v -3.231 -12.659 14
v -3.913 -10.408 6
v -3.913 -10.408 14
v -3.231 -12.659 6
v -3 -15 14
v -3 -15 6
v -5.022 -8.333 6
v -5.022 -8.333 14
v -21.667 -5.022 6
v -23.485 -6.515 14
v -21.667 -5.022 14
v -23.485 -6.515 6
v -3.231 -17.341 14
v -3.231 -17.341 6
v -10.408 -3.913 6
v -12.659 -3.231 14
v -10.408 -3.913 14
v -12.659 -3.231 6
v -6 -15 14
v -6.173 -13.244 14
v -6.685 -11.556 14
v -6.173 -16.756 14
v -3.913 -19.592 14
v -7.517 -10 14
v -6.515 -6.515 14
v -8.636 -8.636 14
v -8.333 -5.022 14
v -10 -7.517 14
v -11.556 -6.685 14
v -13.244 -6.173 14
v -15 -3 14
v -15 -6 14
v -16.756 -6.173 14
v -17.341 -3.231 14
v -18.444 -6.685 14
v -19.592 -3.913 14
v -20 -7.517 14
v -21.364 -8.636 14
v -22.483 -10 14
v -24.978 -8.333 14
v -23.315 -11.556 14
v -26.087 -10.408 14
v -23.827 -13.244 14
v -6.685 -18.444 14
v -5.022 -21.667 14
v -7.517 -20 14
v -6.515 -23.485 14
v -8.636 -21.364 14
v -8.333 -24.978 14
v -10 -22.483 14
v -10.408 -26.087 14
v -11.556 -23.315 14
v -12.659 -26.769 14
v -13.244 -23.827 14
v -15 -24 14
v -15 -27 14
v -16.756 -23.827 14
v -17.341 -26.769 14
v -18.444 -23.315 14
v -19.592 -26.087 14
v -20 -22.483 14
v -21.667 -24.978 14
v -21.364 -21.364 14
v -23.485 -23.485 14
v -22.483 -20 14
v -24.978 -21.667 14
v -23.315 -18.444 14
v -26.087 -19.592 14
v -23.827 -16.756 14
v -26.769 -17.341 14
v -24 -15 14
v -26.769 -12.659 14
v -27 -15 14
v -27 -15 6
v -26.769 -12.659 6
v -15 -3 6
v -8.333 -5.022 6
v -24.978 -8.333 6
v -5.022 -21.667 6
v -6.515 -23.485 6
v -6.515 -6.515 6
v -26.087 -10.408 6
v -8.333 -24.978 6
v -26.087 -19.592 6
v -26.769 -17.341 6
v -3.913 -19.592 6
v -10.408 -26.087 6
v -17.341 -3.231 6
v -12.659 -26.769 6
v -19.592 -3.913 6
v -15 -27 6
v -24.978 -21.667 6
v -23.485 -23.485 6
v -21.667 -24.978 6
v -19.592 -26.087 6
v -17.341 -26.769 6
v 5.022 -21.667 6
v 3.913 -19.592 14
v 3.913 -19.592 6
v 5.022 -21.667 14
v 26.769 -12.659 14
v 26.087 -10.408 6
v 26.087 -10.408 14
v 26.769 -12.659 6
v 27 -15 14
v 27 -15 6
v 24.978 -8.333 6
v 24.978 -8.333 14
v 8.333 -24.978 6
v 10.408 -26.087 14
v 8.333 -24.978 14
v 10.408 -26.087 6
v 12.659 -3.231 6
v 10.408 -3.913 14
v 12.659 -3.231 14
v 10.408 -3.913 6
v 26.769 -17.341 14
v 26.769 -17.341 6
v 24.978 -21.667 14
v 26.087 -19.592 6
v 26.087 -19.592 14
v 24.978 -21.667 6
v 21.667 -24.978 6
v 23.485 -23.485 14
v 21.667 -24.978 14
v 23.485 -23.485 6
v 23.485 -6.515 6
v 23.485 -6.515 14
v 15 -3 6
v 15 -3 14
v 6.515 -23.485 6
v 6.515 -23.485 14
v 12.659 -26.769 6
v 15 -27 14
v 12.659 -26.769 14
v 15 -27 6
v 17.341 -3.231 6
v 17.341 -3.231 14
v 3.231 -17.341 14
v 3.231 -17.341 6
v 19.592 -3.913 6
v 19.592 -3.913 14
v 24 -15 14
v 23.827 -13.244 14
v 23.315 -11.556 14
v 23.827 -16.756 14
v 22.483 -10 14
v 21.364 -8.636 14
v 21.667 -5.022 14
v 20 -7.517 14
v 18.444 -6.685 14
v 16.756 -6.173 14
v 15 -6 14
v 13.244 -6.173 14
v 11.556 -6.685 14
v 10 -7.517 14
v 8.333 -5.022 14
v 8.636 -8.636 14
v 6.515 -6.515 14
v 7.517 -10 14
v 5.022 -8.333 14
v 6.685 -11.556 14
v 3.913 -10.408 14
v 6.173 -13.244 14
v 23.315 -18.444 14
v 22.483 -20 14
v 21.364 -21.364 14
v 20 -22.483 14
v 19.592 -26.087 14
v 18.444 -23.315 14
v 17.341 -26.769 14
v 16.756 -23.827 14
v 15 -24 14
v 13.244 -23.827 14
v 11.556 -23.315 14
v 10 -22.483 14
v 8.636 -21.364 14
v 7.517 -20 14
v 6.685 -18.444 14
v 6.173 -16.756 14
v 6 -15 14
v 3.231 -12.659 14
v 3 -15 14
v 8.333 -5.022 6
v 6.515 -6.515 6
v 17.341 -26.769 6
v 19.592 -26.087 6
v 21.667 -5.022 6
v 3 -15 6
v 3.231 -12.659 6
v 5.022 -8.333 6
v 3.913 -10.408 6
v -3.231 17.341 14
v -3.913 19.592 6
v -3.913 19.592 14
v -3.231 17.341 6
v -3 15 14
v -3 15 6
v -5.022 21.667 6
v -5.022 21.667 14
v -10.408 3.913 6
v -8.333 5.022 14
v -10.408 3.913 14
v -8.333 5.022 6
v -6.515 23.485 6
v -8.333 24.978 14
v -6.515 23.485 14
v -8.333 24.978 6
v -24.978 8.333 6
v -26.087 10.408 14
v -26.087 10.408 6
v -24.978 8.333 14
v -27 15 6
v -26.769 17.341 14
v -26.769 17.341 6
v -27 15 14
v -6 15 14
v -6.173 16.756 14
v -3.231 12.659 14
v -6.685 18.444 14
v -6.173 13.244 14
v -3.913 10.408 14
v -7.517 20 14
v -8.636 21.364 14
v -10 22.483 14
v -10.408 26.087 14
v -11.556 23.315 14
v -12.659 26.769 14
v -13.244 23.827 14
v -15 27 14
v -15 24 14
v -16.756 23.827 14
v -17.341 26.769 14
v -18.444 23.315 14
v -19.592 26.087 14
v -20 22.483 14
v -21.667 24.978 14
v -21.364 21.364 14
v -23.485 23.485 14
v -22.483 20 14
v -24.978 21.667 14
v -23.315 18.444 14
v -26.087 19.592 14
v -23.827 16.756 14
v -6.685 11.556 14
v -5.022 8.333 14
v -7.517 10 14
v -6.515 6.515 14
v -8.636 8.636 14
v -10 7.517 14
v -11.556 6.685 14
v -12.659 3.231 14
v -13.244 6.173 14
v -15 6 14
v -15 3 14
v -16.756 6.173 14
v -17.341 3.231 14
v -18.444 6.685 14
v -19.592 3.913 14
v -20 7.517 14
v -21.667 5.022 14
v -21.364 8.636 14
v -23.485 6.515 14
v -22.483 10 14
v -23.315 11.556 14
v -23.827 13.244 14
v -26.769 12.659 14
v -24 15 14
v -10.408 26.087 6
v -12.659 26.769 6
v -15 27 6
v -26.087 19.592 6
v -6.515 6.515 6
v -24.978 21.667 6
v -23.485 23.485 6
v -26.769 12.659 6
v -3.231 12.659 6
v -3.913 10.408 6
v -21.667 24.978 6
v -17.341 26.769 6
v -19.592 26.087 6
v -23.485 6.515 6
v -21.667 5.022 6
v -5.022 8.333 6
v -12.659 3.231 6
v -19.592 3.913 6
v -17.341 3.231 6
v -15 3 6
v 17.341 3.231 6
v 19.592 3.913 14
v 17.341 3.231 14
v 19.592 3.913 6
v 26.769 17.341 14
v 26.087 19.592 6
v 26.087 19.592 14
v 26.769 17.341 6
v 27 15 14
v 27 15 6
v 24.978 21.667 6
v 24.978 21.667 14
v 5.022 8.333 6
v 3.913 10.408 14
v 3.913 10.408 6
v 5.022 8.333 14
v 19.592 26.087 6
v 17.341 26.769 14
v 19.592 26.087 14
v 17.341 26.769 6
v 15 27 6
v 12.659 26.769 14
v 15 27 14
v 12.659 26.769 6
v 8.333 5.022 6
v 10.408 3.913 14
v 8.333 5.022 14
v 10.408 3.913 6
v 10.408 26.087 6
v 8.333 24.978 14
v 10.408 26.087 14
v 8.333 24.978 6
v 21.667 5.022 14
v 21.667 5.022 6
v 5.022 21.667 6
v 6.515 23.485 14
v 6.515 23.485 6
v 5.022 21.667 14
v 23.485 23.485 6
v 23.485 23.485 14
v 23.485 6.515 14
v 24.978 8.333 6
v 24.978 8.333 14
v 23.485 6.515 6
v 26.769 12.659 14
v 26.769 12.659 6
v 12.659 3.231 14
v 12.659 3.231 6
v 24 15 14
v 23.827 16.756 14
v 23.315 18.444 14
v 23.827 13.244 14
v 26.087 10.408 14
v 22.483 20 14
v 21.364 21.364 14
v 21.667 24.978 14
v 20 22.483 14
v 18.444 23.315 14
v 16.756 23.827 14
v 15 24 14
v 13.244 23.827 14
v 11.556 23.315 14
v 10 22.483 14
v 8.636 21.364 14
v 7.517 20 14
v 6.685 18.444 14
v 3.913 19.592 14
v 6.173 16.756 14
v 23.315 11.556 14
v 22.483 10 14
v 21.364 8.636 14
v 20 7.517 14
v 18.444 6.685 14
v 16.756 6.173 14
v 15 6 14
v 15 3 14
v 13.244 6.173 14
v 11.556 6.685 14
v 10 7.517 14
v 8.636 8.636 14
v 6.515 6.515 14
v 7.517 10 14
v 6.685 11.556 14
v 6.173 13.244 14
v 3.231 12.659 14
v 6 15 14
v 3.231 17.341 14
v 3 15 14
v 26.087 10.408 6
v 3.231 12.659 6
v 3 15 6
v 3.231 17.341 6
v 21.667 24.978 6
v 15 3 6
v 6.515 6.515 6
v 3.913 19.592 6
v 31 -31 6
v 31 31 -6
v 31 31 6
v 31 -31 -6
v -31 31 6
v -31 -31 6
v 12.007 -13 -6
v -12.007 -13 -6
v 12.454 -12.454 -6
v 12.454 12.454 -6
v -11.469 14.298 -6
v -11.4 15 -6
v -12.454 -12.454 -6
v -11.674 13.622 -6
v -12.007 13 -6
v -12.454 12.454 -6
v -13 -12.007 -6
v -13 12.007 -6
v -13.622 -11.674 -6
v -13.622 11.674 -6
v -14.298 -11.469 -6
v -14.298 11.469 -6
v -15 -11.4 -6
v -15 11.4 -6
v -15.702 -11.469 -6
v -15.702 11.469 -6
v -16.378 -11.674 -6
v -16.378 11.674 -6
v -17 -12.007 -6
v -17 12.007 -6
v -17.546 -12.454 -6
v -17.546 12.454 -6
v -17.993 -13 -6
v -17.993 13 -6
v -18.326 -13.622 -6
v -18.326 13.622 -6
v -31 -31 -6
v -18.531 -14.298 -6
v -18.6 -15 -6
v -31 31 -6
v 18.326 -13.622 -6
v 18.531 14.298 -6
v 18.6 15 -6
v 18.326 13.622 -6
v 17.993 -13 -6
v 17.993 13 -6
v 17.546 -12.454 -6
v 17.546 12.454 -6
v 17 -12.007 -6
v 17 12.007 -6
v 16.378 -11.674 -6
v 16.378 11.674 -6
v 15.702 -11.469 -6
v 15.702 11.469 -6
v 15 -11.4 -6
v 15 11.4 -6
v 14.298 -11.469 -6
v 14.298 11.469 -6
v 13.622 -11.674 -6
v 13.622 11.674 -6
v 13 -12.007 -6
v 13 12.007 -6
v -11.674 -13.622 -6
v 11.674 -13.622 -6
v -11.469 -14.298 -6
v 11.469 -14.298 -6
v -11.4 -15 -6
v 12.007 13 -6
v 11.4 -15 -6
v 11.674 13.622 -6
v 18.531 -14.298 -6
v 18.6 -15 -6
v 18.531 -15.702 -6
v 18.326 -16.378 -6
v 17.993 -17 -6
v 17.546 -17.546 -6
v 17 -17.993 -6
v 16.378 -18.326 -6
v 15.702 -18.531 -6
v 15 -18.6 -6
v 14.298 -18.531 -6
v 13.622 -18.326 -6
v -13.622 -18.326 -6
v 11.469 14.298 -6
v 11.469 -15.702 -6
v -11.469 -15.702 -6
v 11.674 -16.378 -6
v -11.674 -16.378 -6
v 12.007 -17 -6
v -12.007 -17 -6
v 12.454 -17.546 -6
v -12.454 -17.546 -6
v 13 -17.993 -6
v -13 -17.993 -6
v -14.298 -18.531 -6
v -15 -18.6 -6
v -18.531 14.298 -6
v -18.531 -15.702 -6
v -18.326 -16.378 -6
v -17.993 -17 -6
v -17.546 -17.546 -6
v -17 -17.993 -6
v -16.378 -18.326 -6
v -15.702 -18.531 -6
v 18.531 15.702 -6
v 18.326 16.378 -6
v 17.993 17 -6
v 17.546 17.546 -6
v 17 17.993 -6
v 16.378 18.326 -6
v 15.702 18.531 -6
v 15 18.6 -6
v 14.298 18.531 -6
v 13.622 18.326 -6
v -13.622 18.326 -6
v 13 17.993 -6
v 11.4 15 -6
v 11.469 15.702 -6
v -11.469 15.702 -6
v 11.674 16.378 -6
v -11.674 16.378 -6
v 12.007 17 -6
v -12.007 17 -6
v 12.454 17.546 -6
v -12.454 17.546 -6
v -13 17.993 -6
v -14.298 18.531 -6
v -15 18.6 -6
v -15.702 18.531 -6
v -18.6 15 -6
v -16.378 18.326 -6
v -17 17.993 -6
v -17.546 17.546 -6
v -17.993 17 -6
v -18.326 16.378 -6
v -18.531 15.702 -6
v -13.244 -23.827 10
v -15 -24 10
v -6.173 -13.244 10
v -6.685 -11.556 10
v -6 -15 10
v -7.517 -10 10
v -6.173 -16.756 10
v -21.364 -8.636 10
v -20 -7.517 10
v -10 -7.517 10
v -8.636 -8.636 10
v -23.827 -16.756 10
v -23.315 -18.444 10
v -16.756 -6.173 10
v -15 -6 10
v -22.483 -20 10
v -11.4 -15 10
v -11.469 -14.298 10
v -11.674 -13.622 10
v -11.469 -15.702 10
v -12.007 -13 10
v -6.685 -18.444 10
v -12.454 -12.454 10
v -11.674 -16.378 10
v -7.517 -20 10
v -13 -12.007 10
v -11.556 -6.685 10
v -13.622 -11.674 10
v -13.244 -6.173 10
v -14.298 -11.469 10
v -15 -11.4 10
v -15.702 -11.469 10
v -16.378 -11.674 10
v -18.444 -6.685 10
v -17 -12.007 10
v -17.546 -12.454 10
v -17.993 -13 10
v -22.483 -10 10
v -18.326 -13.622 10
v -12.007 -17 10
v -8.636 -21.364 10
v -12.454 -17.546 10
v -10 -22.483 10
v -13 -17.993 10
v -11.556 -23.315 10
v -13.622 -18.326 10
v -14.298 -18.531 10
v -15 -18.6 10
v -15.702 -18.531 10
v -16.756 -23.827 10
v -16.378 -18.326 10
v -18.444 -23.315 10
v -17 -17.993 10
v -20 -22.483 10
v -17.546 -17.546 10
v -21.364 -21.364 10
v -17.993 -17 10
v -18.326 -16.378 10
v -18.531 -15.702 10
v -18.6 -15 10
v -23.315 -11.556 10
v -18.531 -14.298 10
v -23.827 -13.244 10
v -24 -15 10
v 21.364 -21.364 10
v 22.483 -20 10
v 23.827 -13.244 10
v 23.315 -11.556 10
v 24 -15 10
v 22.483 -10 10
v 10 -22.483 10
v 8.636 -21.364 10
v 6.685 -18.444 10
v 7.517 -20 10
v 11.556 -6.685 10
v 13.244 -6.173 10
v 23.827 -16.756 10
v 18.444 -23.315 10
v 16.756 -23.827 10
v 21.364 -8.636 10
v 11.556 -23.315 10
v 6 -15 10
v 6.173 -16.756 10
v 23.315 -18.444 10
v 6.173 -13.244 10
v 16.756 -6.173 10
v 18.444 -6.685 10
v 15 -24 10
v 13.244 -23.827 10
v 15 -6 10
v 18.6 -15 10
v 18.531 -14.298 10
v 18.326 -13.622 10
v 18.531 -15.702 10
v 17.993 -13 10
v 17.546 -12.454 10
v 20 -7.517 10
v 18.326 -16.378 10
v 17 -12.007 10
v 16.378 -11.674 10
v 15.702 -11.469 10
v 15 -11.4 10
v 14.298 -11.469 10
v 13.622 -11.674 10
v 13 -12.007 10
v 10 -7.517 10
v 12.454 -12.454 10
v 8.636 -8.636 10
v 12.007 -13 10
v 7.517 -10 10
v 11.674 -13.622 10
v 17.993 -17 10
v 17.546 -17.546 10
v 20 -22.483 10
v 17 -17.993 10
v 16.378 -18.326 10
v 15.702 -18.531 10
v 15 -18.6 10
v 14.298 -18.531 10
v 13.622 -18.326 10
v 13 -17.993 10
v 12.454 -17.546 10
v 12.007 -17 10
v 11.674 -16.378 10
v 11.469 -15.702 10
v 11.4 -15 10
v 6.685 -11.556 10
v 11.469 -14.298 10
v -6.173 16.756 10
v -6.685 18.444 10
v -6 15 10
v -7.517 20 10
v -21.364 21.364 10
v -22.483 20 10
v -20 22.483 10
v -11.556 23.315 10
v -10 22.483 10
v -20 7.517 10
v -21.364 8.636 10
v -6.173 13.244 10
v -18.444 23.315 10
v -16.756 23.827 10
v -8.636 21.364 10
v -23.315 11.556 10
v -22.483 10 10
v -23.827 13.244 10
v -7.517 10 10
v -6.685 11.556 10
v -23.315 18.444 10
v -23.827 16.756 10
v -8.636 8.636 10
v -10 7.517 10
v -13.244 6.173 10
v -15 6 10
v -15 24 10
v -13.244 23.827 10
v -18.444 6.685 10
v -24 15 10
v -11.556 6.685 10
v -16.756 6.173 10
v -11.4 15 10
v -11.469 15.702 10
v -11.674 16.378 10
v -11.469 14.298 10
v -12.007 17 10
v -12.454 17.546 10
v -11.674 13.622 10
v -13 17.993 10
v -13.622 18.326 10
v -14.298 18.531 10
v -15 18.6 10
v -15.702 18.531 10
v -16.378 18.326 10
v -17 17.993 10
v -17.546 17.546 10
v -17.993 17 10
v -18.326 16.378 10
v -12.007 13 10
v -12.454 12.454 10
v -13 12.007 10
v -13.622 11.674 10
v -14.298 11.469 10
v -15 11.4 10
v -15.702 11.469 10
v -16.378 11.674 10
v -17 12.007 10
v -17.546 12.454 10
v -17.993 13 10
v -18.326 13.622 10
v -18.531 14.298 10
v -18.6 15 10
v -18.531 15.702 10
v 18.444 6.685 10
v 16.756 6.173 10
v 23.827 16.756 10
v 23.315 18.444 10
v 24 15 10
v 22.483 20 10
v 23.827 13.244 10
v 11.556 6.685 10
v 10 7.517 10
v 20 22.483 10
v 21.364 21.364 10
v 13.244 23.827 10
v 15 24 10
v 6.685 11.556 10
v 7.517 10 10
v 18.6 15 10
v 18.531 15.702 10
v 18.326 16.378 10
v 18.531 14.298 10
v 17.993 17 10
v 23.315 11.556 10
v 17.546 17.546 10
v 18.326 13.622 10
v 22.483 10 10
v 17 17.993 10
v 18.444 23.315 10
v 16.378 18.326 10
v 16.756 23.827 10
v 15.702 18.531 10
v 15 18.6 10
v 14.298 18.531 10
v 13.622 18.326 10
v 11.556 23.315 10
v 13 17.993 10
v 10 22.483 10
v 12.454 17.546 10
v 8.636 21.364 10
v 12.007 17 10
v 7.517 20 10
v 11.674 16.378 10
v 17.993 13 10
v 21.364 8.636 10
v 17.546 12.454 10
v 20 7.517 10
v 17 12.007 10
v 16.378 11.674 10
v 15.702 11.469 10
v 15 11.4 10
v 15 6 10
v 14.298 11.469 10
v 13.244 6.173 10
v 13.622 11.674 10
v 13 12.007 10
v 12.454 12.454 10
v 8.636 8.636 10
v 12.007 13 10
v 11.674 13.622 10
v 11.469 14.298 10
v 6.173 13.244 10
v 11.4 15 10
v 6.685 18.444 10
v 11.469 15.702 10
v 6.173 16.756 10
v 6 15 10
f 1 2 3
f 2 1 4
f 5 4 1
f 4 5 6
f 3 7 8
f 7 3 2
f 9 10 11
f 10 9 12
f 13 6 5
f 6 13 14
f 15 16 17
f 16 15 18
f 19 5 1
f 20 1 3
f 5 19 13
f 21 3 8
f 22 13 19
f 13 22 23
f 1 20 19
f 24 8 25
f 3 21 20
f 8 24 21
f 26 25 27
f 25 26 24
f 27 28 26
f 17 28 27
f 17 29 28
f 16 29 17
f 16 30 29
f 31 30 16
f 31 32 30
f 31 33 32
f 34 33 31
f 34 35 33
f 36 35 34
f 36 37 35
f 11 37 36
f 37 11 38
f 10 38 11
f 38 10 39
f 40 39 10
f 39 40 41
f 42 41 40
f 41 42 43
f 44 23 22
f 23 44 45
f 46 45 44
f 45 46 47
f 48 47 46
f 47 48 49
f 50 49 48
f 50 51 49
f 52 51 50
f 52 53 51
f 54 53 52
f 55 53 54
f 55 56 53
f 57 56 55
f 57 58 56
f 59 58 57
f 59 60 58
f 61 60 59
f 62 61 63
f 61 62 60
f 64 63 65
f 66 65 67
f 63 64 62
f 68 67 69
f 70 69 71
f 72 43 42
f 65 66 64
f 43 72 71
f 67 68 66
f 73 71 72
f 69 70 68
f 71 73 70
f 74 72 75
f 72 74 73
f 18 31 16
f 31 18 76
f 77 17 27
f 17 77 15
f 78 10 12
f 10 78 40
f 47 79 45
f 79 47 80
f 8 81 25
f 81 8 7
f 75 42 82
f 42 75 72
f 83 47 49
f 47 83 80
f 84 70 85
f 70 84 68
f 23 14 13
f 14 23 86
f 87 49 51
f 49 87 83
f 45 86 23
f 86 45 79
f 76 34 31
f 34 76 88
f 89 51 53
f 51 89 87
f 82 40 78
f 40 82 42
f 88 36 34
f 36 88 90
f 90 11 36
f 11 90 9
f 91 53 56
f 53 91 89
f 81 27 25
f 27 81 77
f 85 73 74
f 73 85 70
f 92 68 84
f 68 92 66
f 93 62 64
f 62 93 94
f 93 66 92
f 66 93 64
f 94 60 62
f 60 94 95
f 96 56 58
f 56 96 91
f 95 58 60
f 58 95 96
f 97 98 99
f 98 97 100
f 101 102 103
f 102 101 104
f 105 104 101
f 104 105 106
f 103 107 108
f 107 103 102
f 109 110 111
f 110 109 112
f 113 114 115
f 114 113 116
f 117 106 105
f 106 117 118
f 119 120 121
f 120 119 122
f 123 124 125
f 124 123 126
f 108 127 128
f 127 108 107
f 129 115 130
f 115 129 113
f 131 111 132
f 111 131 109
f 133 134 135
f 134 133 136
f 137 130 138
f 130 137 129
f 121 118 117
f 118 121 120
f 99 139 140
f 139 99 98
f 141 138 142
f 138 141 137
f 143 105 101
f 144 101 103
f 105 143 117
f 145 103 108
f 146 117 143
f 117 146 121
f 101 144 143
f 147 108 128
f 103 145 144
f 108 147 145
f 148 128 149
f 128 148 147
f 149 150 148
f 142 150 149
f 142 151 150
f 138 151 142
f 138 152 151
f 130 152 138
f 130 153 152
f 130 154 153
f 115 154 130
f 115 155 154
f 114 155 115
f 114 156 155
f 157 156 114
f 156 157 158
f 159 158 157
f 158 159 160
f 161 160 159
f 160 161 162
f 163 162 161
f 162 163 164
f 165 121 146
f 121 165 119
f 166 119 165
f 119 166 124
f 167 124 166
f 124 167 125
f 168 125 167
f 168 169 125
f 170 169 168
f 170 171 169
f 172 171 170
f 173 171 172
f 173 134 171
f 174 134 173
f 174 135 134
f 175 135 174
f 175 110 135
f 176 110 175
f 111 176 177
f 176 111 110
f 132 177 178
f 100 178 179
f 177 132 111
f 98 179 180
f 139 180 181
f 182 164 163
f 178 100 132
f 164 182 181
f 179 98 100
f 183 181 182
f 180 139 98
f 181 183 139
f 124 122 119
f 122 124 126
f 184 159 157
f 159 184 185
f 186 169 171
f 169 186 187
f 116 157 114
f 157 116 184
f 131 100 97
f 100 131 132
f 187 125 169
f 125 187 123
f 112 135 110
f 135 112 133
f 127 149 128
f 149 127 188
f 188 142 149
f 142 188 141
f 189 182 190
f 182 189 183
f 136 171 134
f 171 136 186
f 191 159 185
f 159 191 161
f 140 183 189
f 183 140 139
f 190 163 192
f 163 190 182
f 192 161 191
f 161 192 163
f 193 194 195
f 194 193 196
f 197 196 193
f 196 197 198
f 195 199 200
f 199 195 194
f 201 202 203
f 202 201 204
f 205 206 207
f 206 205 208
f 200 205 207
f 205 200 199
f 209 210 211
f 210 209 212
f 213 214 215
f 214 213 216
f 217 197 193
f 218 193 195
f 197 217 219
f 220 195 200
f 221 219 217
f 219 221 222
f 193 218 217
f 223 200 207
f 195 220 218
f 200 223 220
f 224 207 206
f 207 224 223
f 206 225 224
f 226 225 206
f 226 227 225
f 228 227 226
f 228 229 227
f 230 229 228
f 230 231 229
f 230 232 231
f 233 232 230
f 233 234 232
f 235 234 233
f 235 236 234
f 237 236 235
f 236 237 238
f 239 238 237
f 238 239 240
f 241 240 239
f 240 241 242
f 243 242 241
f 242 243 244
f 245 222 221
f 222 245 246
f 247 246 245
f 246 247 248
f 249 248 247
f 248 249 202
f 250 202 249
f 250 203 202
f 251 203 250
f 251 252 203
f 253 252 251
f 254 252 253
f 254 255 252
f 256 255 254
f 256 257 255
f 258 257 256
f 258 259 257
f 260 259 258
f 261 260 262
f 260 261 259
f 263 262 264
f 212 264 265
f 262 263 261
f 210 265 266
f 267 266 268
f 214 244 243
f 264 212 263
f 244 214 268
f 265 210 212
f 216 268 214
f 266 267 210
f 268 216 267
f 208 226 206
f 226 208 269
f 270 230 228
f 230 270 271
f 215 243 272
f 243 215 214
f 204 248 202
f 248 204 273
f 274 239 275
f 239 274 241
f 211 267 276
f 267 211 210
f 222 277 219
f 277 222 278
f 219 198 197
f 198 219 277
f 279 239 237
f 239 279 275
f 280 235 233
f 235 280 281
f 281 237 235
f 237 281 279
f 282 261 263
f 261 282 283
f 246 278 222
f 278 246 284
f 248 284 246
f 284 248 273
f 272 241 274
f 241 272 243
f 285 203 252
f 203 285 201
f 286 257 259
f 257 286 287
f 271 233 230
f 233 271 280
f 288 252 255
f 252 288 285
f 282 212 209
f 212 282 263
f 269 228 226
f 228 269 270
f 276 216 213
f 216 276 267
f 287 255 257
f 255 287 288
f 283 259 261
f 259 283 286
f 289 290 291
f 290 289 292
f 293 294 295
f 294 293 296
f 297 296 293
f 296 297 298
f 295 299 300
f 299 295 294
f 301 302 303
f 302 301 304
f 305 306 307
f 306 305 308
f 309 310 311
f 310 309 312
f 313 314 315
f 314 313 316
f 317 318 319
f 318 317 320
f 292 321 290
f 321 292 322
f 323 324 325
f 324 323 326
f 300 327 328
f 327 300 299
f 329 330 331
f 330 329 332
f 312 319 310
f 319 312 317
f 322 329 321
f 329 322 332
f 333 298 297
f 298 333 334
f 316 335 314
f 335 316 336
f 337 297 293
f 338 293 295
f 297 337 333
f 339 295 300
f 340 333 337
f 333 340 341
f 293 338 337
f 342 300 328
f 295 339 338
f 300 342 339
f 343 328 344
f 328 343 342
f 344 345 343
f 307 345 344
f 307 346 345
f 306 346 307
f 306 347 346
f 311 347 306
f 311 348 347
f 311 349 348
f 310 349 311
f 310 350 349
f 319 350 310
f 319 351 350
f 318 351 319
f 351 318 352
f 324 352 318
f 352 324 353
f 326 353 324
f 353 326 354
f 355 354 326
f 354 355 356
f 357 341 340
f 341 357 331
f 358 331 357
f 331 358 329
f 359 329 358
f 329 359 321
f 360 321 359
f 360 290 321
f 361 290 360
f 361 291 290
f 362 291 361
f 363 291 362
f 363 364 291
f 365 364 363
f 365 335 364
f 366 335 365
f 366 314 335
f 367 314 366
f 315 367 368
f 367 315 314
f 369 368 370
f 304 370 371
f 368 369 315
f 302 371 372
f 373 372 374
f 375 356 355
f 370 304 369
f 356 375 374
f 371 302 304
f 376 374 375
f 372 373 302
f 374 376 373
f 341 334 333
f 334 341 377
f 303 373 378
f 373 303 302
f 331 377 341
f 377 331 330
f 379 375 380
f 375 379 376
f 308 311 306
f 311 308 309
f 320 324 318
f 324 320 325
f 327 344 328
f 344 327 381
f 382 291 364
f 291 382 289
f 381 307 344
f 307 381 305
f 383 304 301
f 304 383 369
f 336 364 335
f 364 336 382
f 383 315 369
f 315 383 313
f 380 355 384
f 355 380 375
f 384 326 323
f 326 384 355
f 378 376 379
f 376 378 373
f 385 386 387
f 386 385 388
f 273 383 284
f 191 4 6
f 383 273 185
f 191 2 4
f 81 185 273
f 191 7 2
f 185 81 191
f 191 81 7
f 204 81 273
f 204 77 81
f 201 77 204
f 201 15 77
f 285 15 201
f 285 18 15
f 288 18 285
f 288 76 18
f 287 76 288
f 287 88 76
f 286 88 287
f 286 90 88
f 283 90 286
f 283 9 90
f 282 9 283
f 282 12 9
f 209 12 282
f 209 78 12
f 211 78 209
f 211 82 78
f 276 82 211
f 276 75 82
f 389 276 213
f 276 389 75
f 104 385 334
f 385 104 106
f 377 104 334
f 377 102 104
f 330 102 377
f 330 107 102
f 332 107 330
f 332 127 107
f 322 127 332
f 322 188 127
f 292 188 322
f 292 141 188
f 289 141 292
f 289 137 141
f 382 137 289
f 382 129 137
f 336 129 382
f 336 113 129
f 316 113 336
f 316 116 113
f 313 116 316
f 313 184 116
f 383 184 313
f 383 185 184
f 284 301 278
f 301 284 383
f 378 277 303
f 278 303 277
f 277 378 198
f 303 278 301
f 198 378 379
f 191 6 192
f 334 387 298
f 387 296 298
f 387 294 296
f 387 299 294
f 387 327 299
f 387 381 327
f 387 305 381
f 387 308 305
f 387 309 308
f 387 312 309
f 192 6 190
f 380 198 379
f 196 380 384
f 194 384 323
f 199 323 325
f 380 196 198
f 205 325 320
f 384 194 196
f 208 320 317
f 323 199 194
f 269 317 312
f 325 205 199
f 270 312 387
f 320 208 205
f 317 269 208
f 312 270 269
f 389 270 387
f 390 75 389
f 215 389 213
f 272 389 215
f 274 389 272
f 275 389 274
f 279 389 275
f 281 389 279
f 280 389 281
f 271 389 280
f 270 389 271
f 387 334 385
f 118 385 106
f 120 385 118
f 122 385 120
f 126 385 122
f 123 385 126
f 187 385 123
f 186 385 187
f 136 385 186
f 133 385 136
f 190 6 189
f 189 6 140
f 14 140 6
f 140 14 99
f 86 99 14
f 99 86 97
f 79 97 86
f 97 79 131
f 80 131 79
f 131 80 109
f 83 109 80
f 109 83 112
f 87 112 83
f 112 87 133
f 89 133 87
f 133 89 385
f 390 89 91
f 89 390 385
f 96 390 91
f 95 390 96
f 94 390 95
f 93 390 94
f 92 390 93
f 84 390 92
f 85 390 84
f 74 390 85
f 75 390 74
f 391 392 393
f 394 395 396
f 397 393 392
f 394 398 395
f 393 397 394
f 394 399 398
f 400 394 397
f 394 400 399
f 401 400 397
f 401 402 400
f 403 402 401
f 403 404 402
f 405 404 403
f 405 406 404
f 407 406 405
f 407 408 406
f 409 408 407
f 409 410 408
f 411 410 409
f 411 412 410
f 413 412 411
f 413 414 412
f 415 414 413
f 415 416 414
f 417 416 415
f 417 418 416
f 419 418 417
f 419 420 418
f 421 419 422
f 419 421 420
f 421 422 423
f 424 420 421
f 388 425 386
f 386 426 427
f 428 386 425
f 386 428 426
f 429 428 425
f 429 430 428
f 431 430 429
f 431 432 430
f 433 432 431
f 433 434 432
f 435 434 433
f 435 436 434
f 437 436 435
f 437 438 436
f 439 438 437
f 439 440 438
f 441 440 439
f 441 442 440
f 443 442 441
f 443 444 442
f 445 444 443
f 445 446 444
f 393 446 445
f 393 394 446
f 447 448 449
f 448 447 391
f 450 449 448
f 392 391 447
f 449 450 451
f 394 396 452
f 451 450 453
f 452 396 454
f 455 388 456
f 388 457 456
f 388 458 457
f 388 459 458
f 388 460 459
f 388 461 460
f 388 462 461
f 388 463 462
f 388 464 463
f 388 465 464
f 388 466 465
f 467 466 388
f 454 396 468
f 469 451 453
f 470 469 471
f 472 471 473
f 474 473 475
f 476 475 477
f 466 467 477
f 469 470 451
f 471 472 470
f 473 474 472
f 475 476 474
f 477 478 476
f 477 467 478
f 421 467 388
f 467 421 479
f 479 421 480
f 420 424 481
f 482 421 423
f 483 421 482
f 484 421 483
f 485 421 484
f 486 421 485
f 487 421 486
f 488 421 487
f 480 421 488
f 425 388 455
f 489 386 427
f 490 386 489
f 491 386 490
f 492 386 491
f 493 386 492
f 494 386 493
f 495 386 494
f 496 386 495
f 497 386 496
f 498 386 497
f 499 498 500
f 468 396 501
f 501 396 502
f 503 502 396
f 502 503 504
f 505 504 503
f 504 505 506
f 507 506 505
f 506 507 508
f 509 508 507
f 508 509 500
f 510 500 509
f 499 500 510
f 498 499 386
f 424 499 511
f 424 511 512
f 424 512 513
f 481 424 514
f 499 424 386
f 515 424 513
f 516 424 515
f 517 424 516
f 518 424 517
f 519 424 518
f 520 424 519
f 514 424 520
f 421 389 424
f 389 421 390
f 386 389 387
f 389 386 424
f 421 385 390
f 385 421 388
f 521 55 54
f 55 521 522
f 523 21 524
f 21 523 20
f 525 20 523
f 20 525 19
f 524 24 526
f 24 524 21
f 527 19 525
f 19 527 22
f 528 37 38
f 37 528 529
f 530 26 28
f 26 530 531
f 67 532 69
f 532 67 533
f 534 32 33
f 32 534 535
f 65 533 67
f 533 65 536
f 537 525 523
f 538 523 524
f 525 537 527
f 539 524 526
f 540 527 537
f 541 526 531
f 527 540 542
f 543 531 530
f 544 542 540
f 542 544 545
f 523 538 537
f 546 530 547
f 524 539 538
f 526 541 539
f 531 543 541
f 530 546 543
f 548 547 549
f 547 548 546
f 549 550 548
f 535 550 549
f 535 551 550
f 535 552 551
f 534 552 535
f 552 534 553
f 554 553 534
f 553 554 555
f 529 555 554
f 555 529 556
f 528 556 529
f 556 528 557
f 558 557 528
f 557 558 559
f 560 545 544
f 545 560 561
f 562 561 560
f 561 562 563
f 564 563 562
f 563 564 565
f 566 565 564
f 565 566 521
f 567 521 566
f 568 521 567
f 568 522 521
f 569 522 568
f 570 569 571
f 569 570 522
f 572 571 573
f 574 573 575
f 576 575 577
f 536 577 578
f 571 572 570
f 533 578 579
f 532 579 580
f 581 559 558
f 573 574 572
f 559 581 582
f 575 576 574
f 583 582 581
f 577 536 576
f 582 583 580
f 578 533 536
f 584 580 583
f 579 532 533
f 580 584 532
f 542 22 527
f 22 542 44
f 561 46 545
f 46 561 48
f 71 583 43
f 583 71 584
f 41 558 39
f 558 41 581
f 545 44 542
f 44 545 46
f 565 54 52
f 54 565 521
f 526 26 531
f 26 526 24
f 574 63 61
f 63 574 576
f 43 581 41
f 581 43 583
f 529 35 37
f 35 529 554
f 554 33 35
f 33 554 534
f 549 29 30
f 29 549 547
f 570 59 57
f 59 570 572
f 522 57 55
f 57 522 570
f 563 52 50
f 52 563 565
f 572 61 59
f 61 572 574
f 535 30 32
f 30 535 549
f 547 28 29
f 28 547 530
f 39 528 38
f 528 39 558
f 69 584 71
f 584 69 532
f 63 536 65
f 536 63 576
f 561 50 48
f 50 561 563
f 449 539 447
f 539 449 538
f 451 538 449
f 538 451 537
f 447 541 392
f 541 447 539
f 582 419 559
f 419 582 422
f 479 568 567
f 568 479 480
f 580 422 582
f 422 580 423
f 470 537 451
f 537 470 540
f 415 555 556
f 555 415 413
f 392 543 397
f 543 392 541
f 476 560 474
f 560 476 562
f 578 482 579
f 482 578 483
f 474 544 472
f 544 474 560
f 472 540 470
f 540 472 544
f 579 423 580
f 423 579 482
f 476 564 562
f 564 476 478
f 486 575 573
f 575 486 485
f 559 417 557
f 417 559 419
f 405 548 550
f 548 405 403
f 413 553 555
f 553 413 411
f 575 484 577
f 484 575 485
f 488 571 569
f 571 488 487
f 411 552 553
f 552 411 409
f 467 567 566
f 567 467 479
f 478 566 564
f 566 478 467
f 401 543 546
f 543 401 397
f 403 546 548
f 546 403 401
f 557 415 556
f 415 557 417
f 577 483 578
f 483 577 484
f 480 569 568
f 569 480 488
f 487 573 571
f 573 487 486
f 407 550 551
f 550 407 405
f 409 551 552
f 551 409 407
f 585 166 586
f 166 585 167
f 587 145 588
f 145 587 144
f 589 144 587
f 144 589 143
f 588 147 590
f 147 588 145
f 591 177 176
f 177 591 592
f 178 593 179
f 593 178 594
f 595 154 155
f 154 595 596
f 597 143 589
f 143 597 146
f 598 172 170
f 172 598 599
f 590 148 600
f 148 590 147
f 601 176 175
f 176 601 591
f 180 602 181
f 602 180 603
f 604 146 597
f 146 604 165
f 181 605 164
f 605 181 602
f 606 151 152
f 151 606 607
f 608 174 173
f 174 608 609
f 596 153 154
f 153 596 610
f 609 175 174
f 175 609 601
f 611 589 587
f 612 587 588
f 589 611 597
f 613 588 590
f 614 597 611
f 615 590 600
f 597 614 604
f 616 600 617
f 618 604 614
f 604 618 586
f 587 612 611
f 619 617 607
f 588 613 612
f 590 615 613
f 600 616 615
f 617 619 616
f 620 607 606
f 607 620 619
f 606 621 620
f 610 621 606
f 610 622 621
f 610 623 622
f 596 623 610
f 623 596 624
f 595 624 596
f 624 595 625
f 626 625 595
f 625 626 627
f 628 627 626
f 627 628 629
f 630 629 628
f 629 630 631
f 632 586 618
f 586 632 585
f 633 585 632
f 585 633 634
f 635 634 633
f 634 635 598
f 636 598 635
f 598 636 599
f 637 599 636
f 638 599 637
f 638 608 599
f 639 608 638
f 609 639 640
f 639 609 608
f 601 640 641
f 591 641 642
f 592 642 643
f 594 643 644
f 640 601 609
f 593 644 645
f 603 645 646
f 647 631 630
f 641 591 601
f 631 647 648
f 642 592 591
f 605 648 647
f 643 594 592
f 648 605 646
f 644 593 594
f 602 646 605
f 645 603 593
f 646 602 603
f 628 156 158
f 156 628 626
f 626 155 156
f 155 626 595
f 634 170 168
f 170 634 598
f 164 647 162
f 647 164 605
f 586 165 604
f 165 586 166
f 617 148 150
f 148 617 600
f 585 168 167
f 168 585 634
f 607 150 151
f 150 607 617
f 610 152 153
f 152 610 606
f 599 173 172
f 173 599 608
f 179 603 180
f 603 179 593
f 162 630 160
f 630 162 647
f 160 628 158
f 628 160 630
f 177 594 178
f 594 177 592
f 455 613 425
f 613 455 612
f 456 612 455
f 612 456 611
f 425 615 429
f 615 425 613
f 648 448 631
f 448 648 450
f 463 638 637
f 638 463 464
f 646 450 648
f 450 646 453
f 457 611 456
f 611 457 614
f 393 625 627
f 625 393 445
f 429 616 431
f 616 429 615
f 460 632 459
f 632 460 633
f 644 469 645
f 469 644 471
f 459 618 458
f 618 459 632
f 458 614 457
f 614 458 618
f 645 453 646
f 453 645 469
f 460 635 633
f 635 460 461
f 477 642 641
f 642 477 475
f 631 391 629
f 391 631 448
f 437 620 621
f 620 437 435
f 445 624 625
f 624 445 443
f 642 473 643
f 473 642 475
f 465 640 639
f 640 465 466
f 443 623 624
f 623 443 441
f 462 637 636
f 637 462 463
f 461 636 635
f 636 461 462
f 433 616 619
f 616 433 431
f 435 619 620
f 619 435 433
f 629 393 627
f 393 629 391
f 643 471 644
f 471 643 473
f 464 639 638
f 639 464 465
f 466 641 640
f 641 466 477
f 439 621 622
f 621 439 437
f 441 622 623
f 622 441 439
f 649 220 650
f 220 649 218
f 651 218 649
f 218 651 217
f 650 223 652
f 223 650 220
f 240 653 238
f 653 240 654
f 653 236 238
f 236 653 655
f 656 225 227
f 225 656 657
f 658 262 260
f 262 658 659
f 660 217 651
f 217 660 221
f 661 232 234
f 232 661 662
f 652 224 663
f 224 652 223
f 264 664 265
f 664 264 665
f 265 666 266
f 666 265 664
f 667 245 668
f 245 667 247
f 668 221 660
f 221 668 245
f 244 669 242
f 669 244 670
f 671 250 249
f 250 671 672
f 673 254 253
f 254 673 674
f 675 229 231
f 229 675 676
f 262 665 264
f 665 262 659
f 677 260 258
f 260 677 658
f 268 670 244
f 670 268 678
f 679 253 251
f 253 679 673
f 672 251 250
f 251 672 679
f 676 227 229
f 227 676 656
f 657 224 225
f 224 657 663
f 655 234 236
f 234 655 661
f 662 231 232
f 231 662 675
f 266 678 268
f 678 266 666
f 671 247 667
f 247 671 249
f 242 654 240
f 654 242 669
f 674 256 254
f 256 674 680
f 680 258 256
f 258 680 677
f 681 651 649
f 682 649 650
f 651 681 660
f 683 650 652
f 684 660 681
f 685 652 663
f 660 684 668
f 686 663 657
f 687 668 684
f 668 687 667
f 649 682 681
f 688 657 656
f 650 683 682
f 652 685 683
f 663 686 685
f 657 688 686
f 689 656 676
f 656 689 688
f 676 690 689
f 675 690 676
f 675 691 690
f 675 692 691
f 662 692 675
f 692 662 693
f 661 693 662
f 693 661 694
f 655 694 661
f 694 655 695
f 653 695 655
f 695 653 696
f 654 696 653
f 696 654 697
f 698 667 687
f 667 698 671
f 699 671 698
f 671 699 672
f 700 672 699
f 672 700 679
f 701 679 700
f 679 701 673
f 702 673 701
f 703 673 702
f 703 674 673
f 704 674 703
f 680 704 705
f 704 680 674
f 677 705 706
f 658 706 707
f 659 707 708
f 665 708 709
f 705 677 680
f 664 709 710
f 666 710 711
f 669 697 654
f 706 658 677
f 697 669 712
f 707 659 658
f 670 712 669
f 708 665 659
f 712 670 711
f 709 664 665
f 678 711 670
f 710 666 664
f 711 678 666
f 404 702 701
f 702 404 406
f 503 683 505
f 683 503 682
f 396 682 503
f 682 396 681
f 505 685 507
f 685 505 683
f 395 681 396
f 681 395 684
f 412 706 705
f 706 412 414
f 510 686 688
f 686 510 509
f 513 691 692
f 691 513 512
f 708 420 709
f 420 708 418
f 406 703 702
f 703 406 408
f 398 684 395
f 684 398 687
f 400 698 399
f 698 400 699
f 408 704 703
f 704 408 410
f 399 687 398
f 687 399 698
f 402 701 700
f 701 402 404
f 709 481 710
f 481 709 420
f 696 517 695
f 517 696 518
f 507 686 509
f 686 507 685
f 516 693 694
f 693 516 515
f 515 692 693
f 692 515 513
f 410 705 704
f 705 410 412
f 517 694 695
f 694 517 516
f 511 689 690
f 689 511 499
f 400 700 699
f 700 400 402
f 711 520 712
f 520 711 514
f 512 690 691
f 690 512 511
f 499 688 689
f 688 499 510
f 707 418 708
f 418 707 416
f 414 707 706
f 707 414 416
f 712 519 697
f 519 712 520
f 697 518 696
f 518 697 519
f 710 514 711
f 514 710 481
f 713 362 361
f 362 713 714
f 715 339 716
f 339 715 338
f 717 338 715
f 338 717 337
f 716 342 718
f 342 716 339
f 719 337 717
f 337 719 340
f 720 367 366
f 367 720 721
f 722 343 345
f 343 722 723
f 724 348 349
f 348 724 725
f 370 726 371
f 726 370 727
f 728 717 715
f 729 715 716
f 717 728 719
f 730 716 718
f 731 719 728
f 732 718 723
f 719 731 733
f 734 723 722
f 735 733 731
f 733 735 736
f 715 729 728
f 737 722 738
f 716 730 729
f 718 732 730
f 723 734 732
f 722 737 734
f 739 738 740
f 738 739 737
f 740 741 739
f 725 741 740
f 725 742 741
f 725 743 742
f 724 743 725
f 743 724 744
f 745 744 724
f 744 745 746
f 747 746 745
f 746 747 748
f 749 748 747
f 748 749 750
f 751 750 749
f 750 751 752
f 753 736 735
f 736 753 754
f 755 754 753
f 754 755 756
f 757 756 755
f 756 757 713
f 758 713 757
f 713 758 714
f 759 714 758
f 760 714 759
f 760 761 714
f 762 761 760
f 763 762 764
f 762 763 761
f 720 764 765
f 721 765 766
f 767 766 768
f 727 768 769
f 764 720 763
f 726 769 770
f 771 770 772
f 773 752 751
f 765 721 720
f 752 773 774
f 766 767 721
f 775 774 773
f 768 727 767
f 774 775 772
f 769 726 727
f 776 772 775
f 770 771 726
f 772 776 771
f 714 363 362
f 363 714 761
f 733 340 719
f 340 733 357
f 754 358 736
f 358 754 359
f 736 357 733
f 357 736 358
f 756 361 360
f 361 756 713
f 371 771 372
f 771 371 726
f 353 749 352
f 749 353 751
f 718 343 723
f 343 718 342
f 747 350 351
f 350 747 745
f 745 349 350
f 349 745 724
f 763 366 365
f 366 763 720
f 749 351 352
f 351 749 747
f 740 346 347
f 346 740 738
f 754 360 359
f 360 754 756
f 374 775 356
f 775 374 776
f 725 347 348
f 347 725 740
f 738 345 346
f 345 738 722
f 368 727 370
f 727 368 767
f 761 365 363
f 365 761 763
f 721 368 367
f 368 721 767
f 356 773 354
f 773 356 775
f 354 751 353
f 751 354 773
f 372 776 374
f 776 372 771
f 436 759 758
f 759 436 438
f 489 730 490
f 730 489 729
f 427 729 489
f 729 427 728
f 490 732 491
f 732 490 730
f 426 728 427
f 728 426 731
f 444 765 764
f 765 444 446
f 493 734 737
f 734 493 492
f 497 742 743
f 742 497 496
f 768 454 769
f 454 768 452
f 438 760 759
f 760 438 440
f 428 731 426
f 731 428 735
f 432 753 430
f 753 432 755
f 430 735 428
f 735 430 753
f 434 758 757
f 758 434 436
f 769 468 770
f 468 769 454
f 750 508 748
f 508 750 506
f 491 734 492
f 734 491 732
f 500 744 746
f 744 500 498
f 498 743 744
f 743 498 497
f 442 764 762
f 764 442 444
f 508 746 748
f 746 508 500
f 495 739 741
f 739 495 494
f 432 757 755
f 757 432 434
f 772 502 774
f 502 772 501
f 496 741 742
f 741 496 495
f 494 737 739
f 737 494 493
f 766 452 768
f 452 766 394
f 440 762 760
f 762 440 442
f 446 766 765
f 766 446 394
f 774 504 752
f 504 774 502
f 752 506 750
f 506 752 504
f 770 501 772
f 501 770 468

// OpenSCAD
$fn = 32;

// ----------------------------------------------------------------------
// Socket pad plate
// bosses with counterbored sockets for the screws
// ----------------------------------------------------------------------

// --- parameters (mm) ---
base_t = 12;       // base plate thickness
boss_h = 8;        // boss height above the base plate
boss_d = 24;       // boss diameter
socket_d = 18;     // socket diameter
socket_depth = 4;  // socket depth from the boss face
bolt_d = 7.2;      // screw clearance hole through the socket floor
rows = 2;          // boss rows
cols = 2;          // bosses per row
pitch = 30;        // boss pitch

// --- derived feature positions (mm) ---
height = base_t + boss_h;           // = 20   overall height of the part
plate = [pitch * (cols - 1) + boss_d + 8, pitch * (rows - 1) + boss_d + 8, base_t];  // = [62, 62, 12]   overall size (x, y, z)
span_x = pitch * (cols - 1);        // = 30   distance between outer bosses
span_y = pitch * (rows - 1);        // = 30   distance between boss rows
origin_x = -span_x / 2;             // = -15   X of the first boss
origin_y = -span_y / 2;             // = -15   Y of the first boss
feature_centers = [
  [origin_x + 0 * pitch, origin_y + 0 * pitch],
  [origin_x + 1 * pitch, origin_y + 0 * pitch],
  [origin_x + 0 * pitch, origin_y + 1 * pitch],
  [origin_x + 1 * pitch, origin_y + 1 * pitch]
];   // boss centres: sockets, holes and the pads themselves are placed from here

// base plate, bosses on feature_centers, socket + through hole in each
difference() {
  union() {
    cube(plate, center = true);
    for (centre = feature_centers)
      translate([centre[0], centre[1], plate[2] / 2 - 1])
        cylinder(d = boss_d, h = boss_h + 1);
  }
  for (centre = feature_centers) {
    translate([centre[0], centre[1], plate[2] / 2 + boss_h - socket_depth])
      cylinder(d = socket_d, h = socket_depth + 1);
    translate([centre[0], centre[1], -height])
      cylinder(d = bolt_d, h = 2 * height + 2);  // through the socket floor
  }
}
